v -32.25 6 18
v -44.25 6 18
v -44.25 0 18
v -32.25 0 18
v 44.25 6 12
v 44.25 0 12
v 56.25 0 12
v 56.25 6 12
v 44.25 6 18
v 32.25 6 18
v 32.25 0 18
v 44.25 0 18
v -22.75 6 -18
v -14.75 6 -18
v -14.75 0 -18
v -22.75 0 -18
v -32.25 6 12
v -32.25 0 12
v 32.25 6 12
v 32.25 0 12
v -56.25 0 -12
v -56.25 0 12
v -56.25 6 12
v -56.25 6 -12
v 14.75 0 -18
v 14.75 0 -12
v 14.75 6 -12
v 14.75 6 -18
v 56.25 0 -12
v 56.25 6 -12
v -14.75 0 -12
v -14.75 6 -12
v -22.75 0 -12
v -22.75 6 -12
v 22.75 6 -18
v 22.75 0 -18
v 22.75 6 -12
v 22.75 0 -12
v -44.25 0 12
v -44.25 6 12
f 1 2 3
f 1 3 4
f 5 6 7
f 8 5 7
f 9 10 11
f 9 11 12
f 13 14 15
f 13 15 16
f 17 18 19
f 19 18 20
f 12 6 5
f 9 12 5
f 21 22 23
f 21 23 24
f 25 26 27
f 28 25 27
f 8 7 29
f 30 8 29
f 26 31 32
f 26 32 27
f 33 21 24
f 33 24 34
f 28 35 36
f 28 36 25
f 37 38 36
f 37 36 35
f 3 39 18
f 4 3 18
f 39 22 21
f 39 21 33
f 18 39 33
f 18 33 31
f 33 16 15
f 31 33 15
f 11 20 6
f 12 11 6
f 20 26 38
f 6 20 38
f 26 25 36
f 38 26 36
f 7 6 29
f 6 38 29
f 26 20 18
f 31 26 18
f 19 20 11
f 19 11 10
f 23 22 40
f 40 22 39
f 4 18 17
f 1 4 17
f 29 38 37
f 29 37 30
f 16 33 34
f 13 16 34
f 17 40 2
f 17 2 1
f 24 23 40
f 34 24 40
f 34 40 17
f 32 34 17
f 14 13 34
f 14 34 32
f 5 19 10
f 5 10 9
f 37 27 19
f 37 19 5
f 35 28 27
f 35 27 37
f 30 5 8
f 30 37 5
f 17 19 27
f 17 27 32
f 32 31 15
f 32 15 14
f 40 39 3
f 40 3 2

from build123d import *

# Parameters (mm, degrees)
SKETCH1_W           = 112.5
SKETCH1_H           = 24
BOSS_EXTRUDE1_DEPTH = 6
SKETCH2_W           = 8
SKETCH2_H           = 6
BOSS_EXTRUDE2_DEPTH = 6
SKETCH3_W           = 12
SKETCH3_H           = 6
BOSS_EXTRUDE3_DEPTH = 6


with BuildPart() as part:
    # Sketch1 → Boss-Extrude1 (new body)
    with BuildSketch(Plane(origin=(0, 0, 0), x_dir=(1, 0, 0), z_dir=(0, 1, 0))):
        Rectangle(SKETCH1_W, SKETCH1_H)
    extrude(amount=BOSS_EXTRUDE1_DEPTH)

    # Sketch2 → Boss-Extrude2 (add)
    with BuildSketch(Plane(origin=(0, 0, -12), x_dir=(-1, 0, 0), z_dir=(0, 0, -1))):
        with Locations((-18.75, 3)):
            Rectangle(SKETCH2_W, SKETCH2_H)
        with Locations((18.75, 3)):
            Rectangle(SKETCH2_W, SKETCH2_H)
    extrude(amount=BOSS_EXTRUDE2_DEPTH)

    # Sketch3 → Boss-Extrude3 (add)
    with BuildSketch(Plane.XY.offset(12)):
        with Locations((-38.25, 3)):
            Rectangle(SKETCH3_W, SKETCH3_H)
        with Locations((38.25, 3)):
            Rectangle(SKETCH3_W, SKETCH3_H)
    extrude(amount=BOSS_EXTRUDE3_DEPTH)


solid = part.part
